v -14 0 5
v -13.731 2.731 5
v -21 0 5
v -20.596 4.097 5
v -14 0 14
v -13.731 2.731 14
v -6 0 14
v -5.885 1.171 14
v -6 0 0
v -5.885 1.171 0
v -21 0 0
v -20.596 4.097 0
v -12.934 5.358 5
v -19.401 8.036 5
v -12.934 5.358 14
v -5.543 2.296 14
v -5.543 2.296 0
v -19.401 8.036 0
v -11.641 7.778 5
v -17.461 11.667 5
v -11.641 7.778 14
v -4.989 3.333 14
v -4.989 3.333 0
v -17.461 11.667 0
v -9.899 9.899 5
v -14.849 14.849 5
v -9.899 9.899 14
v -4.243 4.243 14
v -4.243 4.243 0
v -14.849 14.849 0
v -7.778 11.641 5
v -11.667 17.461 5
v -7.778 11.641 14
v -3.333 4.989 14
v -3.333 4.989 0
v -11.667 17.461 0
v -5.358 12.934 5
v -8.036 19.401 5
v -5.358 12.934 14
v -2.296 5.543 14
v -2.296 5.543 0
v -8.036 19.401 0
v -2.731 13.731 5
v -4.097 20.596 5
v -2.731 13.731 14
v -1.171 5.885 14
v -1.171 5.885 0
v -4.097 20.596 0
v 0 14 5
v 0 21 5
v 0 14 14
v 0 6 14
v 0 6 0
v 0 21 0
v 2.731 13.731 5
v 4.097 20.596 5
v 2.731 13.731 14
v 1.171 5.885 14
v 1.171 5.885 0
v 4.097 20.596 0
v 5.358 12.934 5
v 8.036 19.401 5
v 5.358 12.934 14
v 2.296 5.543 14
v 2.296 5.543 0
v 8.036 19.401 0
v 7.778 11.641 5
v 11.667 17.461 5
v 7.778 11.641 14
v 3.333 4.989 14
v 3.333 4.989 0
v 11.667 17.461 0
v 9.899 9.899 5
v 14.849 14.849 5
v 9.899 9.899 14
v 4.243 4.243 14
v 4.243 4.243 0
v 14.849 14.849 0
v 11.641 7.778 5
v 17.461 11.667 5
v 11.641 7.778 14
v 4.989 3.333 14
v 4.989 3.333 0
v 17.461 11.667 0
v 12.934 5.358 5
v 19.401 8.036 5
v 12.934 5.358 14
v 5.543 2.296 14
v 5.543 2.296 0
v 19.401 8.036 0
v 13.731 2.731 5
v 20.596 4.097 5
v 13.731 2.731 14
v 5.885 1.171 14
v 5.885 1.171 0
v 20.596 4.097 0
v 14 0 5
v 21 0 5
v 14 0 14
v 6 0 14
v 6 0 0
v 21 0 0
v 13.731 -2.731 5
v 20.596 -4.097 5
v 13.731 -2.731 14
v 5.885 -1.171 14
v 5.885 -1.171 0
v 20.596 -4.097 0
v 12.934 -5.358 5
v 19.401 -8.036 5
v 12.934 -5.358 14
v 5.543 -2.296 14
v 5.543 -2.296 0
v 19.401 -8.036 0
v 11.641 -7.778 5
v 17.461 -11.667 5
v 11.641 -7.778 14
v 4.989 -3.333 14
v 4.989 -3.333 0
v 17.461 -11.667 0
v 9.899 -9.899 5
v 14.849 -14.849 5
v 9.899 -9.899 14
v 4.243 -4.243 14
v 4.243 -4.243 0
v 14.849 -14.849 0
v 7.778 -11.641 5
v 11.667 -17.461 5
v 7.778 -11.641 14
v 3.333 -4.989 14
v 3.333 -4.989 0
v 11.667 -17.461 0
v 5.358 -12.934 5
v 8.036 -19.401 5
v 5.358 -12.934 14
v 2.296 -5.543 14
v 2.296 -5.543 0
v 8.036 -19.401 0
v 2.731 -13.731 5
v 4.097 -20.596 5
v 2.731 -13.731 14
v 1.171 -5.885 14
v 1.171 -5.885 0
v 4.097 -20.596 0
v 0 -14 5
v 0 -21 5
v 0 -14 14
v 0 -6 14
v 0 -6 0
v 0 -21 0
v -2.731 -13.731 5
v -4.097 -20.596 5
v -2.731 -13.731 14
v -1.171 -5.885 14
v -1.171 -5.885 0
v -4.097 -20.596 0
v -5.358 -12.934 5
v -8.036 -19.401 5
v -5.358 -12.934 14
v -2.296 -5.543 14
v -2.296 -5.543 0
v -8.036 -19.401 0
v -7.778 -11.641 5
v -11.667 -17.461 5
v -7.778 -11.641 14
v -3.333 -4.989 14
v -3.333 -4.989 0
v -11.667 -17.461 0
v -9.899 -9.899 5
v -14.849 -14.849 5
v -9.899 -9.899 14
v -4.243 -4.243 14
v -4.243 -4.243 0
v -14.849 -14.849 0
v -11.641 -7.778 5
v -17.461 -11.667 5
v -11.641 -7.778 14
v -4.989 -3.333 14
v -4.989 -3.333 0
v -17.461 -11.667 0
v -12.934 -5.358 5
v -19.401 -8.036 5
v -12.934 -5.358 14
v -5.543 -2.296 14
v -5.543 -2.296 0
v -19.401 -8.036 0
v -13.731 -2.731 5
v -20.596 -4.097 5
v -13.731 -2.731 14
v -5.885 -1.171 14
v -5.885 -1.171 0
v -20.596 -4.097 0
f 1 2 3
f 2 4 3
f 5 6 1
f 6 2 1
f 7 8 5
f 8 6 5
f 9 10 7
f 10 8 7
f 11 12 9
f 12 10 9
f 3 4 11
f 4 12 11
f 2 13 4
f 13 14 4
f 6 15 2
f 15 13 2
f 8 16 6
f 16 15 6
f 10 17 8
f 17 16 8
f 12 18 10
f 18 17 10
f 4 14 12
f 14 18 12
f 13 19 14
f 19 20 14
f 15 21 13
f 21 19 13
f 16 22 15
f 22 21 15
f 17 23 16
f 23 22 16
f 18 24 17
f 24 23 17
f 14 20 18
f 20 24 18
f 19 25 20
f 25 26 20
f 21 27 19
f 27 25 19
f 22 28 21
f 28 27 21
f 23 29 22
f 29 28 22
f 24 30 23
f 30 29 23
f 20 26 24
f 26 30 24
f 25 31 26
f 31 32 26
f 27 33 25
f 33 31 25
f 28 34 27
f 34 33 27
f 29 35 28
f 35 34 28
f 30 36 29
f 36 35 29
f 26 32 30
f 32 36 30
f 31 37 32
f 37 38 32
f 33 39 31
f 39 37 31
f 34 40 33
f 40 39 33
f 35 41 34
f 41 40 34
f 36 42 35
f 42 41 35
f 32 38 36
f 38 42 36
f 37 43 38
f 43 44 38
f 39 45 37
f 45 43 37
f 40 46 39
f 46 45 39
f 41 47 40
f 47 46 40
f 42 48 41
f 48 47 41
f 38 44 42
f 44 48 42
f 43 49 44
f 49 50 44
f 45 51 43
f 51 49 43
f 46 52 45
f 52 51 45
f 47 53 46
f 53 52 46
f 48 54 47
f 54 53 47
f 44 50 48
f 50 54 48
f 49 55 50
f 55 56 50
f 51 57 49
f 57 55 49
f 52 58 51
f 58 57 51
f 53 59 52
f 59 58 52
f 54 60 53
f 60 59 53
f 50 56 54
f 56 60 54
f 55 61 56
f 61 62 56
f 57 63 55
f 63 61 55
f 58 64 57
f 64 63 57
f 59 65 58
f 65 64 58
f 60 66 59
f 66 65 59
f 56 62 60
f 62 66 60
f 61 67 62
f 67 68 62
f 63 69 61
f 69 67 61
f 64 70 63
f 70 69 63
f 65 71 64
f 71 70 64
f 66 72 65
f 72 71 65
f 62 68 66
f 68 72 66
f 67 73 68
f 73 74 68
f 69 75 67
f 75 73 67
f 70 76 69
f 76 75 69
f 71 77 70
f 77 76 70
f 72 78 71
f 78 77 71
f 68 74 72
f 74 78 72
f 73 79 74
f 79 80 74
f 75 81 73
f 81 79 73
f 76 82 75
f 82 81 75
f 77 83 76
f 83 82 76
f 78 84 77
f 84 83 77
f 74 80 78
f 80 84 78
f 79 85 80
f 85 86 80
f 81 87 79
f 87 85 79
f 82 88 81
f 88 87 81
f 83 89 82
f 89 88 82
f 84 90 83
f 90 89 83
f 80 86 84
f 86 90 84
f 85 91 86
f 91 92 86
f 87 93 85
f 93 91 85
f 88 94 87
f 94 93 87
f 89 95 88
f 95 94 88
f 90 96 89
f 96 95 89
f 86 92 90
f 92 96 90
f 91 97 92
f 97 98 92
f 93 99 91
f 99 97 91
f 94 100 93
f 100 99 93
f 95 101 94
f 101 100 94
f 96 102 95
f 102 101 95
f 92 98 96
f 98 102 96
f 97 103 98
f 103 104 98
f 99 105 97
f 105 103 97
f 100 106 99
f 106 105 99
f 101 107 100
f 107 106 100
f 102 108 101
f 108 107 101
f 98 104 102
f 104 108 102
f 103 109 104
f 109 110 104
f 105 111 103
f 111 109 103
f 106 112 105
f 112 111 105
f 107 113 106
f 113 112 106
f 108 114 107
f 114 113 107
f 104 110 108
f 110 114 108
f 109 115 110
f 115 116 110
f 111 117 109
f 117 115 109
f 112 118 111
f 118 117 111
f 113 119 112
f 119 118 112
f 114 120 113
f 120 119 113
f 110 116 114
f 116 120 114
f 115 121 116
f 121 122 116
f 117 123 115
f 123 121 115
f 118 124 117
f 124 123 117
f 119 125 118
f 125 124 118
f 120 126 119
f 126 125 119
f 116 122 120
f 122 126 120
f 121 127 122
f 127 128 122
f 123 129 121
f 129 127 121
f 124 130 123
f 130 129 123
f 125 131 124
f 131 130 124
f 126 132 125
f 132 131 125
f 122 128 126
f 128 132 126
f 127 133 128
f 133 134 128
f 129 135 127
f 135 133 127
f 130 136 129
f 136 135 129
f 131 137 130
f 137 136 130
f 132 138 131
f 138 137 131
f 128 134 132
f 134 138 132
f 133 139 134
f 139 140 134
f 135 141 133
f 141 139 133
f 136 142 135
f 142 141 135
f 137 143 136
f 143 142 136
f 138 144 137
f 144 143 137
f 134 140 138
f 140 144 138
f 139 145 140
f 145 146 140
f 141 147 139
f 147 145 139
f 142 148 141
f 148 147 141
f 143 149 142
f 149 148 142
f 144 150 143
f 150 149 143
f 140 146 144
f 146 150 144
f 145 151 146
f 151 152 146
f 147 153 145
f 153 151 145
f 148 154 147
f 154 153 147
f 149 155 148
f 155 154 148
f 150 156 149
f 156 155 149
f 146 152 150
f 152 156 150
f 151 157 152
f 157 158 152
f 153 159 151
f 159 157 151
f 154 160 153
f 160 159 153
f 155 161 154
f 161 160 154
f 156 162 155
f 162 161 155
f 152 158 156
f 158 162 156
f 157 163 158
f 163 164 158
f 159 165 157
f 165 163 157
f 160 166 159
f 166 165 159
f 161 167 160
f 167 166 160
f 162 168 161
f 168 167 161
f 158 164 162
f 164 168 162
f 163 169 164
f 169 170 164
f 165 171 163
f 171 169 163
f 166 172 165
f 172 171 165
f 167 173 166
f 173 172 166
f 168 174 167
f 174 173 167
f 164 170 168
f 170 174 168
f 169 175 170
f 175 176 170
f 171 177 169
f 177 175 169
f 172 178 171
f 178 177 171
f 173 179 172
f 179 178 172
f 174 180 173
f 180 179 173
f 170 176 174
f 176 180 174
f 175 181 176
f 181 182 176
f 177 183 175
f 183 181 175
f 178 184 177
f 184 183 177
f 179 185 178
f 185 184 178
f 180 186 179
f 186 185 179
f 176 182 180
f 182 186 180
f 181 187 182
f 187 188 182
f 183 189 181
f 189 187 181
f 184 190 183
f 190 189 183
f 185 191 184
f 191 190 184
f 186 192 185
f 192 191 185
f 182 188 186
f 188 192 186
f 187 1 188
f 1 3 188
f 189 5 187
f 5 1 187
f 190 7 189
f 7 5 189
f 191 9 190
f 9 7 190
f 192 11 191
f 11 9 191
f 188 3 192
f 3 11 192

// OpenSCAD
$fn = 32;

// ----------------------------------------------------------------------
// Arc stop: collar, 14 mm thick
// ----------------------------------------------------------------------

// --- parameters (mm) ---
revolve_angle = 360;      // full turn around the Z axis
profile_points = 6;       // points of the closed outline

profile = [[6, 0], [21, 0], [21, 5], [14, 5], [14, 14], [6, 14]];  // single closed polygon, 6 points, counter clockwise

// --- the one profile operation ---
rotate_extrude(angle = revolve_angle) polygon(points = profile);
